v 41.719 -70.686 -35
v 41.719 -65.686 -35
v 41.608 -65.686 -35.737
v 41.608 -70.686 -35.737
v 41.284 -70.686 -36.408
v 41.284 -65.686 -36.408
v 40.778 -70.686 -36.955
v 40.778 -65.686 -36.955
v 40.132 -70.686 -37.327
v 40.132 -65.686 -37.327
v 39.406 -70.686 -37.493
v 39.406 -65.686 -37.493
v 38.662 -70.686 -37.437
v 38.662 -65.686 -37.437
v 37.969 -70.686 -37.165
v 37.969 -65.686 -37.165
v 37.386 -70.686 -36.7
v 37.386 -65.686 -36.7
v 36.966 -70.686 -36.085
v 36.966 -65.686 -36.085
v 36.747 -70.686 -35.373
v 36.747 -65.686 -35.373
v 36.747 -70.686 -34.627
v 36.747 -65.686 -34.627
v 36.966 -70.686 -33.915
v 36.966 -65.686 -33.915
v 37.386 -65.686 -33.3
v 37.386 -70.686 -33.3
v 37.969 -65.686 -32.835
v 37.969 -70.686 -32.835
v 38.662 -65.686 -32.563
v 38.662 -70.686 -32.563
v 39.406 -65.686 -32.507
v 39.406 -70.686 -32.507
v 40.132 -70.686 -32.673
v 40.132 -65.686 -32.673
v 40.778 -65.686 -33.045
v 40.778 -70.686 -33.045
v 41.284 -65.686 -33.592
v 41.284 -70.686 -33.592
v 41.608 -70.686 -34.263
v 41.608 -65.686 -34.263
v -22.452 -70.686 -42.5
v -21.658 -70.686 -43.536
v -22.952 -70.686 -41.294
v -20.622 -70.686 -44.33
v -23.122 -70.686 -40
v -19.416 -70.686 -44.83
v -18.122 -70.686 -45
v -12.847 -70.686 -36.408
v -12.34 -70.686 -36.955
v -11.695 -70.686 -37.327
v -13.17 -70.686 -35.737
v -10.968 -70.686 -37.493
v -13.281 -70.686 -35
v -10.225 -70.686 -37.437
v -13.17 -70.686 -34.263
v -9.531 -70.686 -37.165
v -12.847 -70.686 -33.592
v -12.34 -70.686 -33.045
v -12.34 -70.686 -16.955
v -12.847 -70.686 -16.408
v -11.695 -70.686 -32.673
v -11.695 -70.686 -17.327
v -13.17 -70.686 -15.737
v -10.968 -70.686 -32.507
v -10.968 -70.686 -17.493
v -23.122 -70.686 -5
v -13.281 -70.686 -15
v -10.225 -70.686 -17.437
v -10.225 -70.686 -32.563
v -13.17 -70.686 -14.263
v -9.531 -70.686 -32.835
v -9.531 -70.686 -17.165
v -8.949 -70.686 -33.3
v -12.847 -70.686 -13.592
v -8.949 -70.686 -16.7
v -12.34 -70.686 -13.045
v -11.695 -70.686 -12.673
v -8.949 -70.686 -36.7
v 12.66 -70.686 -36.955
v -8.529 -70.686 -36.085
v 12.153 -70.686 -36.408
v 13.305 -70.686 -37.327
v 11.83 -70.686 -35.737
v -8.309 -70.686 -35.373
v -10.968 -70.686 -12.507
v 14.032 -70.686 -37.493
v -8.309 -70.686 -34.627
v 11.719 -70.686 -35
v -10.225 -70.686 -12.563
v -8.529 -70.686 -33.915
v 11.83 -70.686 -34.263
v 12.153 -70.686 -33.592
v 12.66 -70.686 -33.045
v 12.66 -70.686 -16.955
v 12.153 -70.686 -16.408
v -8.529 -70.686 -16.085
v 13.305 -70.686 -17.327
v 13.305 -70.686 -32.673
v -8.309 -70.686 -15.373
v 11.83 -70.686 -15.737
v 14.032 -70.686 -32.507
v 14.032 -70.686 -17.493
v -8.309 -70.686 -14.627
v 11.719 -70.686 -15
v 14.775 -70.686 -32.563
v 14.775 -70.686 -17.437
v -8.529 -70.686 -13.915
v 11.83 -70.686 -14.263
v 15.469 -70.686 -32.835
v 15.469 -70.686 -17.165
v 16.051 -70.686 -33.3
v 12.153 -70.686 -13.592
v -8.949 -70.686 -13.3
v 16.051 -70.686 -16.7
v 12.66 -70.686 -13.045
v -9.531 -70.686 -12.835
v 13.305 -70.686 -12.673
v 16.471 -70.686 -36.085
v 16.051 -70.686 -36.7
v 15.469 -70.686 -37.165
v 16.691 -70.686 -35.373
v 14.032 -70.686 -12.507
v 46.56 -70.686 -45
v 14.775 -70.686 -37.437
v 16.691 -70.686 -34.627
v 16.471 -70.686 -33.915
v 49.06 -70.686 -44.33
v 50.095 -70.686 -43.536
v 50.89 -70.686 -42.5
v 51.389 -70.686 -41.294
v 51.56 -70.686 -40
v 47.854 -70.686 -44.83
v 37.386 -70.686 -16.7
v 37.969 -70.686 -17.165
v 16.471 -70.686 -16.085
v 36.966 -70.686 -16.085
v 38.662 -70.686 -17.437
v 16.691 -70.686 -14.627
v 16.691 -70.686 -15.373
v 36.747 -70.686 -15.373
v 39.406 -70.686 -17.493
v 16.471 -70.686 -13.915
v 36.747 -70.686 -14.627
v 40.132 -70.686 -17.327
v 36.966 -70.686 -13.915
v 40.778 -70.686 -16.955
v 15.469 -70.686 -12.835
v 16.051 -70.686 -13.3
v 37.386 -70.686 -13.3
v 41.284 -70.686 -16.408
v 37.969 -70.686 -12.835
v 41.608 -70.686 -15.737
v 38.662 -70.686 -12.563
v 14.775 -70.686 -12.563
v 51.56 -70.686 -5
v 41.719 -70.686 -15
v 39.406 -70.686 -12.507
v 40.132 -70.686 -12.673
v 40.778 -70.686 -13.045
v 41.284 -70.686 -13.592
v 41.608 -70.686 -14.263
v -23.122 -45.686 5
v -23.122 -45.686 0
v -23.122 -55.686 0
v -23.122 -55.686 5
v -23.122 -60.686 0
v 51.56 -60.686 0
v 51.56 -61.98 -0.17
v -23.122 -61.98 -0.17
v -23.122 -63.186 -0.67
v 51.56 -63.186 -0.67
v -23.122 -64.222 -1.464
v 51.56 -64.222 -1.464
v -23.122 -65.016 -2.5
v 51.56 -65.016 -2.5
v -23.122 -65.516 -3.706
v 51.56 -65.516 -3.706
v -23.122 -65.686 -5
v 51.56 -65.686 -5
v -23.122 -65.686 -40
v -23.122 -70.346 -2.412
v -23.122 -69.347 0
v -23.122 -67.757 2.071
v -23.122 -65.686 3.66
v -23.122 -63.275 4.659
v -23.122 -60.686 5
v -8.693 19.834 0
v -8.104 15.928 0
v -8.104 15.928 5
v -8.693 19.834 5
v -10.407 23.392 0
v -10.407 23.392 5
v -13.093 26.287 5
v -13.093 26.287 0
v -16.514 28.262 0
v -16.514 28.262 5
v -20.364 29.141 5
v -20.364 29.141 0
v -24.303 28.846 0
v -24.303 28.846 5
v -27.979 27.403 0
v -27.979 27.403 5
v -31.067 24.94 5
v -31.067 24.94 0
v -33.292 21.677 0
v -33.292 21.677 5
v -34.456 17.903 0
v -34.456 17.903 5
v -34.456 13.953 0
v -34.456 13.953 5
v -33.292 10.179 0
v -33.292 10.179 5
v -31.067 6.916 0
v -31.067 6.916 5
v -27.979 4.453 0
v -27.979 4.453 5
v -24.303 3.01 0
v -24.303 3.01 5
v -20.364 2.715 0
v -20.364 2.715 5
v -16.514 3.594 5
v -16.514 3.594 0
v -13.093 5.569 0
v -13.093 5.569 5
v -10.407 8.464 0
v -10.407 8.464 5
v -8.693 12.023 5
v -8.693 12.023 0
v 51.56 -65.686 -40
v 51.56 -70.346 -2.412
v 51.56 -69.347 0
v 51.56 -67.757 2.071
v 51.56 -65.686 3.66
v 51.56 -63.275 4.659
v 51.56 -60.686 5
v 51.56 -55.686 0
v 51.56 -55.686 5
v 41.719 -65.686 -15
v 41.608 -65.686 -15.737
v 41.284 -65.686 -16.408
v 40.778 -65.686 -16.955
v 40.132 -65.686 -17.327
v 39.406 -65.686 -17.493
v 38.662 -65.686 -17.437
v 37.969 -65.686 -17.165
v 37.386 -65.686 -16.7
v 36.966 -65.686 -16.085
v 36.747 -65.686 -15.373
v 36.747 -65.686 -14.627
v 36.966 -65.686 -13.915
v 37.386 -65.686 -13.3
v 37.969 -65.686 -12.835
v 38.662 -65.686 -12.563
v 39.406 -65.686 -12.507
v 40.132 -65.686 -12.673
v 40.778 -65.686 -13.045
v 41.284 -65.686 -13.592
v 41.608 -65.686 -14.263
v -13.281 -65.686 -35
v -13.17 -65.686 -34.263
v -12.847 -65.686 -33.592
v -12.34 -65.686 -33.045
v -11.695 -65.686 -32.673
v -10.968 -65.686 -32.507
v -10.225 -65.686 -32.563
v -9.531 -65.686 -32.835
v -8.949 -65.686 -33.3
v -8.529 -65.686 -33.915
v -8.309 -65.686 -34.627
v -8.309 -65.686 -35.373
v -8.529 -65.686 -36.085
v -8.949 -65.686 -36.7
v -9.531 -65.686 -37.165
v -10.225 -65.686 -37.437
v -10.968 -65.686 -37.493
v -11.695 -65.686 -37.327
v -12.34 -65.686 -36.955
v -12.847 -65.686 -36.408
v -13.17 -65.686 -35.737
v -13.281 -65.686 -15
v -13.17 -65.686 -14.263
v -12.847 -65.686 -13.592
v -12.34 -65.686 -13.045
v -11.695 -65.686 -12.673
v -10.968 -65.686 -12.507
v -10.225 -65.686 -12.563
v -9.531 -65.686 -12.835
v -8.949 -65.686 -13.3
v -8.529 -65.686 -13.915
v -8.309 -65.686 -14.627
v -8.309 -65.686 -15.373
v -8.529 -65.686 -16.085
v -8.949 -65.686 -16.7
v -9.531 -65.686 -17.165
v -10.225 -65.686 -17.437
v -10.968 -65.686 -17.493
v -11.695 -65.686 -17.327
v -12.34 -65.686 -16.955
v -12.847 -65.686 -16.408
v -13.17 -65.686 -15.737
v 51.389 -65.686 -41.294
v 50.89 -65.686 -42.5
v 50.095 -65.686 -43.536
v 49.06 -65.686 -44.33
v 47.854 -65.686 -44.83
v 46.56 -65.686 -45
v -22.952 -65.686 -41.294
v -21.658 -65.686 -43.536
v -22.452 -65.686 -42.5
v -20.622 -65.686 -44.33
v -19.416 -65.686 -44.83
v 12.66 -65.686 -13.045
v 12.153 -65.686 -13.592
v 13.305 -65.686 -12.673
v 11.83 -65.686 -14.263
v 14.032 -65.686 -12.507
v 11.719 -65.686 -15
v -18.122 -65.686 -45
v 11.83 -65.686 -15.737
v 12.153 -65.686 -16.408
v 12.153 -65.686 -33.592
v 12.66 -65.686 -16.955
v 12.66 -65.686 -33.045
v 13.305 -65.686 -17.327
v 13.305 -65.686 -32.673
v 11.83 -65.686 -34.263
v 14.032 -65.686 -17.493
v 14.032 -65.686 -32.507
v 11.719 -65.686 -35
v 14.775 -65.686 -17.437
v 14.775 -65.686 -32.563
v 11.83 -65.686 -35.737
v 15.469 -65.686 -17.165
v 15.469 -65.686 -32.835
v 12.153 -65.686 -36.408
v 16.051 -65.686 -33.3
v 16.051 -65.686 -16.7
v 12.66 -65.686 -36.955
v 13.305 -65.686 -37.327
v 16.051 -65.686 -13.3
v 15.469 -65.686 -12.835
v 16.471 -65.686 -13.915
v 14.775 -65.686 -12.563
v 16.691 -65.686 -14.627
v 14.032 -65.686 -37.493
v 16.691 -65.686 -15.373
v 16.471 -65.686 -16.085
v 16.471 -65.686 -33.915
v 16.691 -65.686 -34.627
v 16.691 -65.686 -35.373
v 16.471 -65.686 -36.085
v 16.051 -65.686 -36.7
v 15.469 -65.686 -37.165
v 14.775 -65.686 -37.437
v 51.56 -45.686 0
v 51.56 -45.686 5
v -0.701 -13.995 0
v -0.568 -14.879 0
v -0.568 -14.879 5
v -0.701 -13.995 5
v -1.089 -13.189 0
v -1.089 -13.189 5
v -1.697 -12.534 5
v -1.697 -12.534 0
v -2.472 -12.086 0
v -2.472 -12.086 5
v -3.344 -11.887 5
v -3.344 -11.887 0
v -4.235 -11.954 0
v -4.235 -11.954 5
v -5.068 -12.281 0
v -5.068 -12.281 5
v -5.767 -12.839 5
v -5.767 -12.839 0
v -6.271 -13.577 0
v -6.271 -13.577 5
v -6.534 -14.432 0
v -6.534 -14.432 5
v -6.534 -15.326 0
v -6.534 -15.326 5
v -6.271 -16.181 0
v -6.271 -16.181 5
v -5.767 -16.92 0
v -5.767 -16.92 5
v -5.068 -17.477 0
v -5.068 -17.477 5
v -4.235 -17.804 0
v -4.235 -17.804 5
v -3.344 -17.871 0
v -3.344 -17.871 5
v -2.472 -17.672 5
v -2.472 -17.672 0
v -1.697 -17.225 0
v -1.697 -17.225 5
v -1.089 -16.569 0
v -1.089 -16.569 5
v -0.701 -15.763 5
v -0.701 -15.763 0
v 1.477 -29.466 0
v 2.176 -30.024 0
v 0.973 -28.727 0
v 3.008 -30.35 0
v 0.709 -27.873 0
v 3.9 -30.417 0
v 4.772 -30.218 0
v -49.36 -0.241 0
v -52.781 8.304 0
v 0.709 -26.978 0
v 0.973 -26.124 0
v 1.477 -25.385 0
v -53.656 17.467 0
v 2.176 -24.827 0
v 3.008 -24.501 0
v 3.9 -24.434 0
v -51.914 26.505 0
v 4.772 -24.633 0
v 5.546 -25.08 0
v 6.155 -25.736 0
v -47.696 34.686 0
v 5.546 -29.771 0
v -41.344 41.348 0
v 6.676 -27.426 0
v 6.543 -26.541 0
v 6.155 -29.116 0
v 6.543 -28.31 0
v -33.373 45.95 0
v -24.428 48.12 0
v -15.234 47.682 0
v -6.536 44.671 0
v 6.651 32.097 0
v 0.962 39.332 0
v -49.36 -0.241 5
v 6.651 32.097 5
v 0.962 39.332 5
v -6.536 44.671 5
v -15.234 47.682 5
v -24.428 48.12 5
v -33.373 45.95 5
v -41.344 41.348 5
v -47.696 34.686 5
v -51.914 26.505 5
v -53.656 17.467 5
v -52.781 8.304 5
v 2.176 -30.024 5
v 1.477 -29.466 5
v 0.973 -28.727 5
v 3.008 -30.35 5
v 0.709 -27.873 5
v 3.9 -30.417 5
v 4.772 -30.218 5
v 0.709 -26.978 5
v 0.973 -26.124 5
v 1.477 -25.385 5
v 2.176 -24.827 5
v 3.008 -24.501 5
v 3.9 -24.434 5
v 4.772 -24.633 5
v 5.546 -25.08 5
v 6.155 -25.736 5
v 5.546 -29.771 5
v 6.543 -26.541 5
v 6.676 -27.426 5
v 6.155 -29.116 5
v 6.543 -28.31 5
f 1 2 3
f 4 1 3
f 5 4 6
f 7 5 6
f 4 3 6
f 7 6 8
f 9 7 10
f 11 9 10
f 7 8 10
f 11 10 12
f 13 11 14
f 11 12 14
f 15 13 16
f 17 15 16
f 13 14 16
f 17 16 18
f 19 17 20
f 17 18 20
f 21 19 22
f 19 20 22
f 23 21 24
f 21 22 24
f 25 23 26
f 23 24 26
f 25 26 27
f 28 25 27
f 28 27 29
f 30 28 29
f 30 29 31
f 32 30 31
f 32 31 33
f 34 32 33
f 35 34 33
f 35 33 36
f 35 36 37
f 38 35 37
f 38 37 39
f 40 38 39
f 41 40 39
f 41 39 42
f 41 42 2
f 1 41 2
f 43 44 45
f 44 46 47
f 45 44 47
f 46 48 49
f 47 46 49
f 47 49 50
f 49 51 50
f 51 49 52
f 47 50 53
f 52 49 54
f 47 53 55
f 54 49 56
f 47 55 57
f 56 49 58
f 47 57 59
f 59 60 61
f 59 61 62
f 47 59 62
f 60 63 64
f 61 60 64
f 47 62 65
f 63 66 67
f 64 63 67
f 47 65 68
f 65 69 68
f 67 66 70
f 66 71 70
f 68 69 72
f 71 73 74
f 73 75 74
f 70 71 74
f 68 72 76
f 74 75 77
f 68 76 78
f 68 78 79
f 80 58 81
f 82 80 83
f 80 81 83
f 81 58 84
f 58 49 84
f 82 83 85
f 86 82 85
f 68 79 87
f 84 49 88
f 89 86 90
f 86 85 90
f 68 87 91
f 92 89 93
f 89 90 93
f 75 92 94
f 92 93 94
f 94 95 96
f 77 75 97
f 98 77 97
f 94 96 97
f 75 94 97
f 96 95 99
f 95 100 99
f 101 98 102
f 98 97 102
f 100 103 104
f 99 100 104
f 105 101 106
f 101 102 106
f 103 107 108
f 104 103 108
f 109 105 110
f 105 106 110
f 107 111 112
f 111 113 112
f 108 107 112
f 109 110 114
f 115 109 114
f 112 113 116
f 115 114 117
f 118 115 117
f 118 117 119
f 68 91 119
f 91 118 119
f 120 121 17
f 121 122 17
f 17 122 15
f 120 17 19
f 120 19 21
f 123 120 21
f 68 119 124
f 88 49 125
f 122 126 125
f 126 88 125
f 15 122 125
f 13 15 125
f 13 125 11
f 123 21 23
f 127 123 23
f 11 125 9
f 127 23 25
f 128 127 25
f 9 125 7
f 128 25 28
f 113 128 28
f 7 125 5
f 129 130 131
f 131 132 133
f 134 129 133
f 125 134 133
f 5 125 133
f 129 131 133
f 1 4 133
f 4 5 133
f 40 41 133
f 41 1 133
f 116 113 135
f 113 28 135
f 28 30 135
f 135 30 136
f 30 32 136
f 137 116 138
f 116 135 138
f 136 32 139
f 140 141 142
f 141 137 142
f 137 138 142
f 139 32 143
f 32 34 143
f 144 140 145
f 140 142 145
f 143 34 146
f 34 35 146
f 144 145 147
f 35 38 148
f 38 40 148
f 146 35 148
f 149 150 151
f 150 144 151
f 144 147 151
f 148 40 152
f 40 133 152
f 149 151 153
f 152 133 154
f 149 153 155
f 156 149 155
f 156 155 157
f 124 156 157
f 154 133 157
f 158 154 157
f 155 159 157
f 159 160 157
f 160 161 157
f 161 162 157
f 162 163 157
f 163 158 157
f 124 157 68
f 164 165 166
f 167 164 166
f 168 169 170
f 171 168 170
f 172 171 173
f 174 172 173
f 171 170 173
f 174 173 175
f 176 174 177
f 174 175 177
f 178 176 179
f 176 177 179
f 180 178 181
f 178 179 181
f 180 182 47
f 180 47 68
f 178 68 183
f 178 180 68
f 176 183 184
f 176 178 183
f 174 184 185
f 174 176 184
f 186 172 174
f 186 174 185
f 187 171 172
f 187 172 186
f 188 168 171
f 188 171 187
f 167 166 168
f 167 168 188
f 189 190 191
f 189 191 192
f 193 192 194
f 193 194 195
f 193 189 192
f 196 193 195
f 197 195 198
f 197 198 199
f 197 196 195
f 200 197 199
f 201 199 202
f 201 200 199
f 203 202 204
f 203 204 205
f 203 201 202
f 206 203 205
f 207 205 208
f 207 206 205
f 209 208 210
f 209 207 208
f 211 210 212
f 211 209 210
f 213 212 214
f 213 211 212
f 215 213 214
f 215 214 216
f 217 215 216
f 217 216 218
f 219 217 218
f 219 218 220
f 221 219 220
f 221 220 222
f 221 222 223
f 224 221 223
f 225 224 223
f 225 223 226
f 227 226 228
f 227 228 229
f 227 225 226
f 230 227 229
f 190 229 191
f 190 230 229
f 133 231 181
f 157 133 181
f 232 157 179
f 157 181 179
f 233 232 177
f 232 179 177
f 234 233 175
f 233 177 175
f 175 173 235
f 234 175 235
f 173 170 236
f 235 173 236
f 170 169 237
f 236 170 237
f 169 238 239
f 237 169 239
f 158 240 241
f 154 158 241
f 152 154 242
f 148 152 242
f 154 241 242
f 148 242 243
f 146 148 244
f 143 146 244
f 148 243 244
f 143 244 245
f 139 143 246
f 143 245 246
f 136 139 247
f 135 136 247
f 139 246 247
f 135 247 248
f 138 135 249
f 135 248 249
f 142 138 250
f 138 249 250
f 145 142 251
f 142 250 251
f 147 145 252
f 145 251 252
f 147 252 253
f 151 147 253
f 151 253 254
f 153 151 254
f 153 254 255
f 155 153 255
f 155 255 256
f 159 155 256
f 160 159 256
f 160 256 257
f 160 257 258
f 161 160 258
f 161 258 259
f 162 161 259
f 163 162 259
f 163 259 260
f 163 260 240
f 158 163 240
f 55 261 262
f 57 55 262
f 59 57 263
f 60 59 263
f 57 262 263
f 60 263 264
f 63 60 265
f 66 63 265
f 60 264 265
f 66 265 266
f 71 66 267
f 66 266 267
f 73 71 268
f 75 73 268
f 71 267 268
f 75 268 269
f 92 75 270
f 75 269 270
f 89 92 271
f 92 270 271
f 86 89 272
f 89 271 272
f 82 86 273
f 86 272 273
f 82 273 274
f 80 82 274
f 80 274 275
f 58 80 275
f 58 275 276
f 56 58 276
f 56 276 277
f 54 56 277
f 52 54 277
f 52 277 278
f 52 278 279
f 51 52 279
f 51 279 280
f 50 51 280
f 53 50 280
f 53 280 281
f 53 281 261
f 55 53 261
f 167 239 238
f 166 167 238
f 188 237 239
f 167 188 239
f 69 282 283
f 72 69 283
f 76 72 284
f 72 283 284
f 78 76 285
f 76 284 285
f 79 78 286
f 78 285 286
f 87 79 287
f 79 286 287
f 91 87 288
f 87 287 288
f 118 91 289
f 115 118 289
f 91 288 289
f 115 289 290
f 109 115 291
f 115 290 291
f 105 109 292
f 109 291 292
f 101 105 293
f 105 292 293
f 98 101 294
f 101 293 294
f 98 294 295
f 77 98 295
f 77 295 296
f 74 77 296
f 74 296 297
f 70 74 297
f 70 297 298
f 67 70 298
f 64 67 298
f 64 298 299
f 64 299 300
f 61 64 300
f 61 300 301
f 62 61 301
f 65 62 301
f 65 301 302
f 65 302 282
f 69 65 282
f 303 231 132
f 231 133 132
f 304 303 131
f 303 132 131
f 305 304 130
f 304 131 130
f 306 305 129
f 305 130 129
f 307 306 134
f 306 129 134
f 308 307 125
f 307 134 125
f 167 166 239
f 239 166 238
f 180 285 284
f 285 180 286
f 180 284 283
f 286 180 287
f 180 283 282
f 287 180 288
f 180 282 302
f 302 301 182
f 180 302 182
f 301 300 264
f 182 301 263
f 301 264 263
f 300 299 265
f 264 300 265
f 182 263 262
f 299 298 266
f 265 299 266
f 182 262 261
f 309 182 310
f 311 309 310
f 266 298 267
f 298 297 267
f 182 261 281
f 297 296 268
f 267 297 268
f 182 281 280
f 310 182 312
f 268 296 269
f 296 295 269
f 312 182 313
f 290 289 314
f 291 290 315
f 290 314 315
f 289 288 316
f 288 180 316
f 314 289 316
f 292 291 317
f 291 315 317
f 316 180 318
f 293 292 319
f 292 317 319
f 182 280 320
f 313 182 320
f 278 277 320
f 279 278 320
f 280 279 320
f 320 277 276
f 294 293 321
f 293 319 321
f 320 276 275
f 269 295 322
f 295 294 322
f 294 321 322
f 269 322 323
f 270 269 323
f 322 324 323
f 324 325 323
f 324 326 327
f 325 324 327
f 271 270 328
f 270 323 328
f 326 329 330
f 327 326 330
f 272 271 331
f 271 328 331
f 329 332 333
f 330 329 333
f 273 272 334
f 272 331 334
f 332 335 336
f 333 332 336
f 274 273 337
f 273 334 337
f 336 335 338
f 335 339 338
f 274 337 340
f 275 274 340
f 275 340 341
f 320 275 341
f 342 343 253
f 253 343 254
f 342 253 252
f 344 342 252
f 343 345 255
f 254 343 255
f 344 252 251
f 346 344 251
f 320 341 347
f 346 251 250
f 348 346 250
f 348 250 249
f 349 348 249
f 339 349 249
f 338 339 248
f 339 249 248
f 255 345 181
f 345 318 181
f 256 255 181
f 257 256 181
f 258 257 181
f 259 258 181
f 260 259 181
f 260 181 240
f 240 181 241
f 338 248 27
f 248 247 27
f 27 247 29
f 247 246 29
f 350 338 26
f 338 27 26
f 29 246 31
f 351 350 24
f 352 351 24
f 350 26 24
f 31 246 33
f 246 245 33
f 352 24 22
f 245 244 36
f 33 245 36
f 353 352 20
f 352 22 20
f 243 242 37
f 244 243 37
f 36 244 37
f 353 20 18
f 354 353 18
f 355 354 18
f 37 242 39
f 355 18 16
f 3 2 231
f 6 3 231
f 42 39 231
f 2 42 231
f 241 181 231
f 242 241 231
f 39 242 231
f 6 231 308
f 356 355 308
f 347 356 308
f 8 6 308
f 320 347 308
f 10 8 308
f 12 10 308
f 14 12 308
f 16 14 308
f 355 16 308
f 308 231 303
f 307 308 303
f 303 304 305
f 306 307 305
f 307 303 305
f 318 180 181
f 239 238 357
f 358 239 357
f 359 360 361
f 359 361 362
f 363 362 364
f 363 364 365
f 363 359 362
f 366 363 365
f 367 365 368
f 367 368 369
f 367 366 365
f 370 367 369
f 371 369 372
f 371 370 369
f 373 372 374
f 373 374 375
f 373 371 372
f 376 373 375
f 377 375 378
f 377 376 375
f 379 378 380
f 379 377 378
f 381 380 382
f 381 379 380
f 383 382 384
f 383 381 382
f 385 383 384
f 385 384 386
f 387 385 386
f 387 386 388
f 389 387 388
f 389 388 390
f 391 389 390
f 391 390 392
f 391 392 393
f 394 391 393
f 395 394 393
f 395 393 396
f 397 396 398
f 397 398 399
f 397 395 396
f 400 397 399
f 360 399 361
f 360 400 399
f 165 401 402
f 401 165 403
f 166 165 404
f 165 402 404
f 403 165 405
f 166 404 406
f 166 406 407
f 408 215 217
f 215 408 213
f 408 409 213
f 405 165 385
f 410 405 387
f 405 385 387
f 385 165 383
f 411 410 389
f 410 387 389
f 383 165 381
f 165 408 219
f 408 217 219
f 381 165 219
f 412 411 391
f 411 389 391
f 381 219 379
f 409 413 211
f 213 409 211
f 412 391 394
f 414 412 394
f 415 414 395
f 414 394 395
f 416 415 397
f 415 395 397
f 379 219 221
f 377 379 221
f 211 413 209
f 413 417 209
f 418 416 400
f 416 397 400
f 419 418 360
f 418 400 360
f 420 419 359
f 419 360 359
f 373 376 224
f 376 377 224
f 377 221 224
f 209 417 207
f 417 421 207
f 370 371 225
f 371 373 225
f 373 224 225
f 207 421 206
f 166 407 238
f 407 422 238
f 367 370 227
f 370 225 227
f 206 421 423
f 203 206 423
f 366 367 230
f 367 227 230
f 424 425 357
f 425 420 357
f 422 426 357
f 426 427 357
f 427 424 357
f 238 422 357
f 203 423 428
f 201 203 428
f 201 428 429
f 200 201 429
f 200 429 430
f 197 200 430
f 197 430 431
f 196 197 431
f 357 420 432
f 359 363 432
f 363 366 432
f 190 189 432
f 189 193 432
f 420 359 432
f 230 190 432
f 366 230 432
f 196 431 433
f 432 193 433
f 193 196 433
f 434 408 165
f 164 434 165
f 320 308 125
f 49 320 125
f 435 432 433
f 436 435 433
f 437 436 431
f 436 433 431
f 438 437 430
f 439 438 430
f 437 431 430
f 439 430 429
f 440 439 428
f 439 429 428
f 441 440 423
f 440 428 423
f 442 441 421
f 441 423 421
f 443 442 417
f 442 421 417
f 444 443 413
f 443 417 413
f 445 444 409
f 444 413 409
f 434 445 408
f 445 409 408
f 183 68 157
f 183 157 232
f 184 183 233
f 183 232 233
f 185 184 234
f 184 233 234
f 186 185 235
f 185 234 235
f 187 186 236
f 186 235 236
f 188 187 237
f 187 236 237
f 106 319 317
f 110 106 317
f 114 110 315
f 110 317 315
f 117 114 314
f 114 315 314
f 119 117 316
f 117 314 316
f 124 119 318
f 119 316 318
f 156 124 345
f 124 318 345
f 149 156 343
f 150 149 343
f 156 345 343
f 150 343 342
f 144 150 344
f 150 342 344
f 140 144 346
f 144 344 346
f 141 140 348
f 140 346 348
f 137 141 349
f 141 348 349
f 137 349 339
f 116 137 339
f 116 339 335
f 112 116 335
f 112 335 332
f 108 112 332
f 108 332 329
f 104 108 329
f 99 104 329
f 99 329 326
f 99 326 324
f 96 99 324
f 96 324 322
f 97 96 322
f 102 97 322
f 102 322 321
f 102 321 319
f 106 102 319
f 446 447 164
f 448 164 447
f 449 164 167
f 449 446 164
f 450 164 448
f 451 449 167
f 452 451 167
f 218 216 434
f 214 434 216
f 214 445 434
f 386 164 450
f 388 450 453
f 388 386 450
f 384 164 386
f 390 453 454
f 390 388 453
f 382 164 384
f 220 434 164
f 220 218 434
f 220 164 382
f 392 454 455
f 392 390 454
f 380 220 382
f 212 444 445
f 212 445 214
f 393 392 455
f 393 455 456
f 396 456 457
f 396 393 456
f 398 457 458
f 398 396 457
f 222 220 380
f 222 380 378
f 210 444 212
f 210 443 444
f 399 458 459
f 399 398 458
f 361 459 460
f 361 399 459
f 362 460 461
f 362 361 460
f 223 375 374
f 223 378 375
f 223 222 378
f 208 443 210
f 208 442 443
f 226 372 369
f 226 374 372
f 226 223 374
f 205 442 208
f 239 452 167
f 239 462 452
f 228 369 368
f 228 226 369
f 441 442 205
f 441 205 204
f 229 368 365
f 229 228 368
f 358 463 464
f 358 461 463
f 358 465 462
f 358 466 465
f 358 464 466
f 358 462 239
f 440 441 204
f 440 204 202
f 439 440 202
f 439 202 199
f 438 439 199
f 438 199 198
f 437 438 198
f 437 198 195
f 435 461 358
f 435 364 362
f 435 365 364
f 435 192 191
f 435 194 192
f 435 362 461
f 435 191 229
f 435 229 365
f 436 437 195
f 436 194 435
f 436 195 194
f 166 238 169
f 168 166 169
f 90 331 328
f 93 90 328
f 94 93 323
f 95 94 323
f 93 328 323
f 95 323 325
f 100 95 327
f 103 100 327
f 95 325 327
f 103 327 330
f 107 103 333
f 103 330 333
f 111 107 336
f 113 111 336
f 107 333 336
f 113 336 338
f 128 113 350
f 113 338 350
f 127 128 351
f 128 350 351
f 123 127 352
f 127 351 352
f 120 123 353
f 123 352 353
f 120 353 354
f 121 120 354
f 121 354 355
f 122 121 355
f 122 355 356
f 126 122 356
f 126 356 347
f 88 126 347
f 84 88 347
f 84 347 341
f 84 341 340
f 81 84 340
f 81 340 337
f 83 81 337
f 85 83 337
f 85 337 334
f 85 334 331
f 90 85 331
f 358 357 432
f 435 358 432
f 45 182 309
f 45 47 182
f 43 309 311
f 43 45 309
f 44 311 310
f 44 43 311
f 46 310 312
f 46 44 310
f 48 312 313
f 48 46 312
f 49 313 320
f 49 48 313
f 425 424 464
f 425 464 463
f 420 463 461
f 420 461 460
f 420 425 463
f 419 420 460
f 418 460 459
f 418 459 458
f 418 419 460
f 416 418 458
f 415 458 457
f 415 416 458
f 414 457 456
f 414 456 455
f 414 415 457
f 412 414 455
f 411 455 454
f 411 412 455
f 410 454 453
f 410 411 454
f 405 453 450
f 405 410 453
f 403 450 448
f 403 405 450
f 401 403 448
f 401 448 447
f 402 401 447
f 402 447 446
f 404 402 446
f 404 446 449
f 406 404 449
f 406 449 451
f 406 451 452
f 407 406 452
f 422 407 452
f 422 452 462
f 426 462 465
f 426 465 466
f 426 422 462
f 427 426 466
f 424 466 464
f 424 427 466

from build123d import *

# Parameters (mm, degrees)
SKETCH_1_R             = 13.25
SKETCH_1_R_2           = 3
EXTRUDE_1_DEPTH        = 5
SM_BASE_FLANGE_1_DEPTH = 74.681955
SKETCH_8_R             = 2.5
CUT_EXTRUDE_1_DEPTH    = 134.765093758
FILLET_1_R             = 5


# Sheet-metal steps are written as plain solids
with BuildPart() as part:
    # Sketch 1 → 凸台-拉伸1 (new body)
    with BuildSketch(Plane.XY):
        with BuildLine():
            Line((-49.360062144, -0.241015089), (-23.122201524, -45.686322765))
            Line((-23.122201524, -45.686322765), (-23.122201524, -55.686322765))
            Line((-23.122201524, -55.686322765), (51.559753885, -55.686322765))
            Line((51.559753885, -55.686322765), (51.559753885, -45.686322765))
            Line((51.559753885, -45.686322765), (6.651404412, 32.097220205))
            ThreePointArc((6.651404412, 32.097220205), (-37.523446513, 43.933835837), (-49.360062144, -0.241015089))
        make_face()
        with Locations((-21.354328866, 15.928102558)):
            Circle(SKETCH_1_R, mode=Mode.SUBTRACT)
        with Locations((-3.567776343, -14.879110103)):
            Circle(SKETCH_1_R_2, mode=Mode.SUBTRACT)
        with Locations((3.675910259, -27.425543331)):
            Circle(SKETCH_1_R_2, mode=Mode.SUBTRACT)
    extrude(amount=EXTRUDE_1_DEPTH)


with BuildPart() as body_2:
    # 草图3 → 基体-法兰1 (new body)
    with BuildSketch(Plane(origin=(51.559753885, 0, 0), x_dir=(0, 0, -1), z_dir=(1, 0, 0))):
        with BuildLine():
            Line((0, -55.686322765), (0, -60.686322765))
            ThreePointArc((0, -60.686322765), (1.464466094, -64.221856671), (5, -65.686322765))
            Line((5, -65.686322765), (45, -65.686322765))
            Line((45, -65.686322765), (45, -70.686322765))
            Line((45, -70.686322765), (5, -70.686322765))
            ThreePointArc((5, -70.686322765), (-2.071067812, -67.757390577), (-5, -60.686322765))
            Line((-5, -60.686322765), (-5, -55.686322765))
            Line((-5, -55.686322765), (0, -55.686322765))
        make_face()
    extrude(amount=-SM_BASE_FLANGE_1_DEPTH)

    # 草图8 → 切除-拉伸1 (cut, through all)
    with BuildSketch(Plane(origin=(0, -65.686322765, 0), x_dir=(1, 0, 0), z_dir=(0, 1, 0))):
        with Locations(Location((14.21877618, 35, 0), (0, 0, 180))):
            Circle(SKETCH_8_R)
        with Locations(Location((-10.78122382, 35, 0), (0, 0, 180))):
            Circle(SKETCH_8_R)
        with Locations(Location((-10.78122382, 15, 0), (0, 0, 180))):
            Circle(SKETCH_8_R)
        with Locations((39.21877618, 15)):
            Circle(SKETCH_8_R)
        with Locations((39.21877618, 35)):
            Circle(SKETCH_8_R)
        with Locations(Location((14.21877618, 15, 0), (0, 0, 180))):
            Circle(SKETCH_8_R)
    extrude(amount=-CUT_EXTRUDE_1_DEPTH, mode=Mode.SUBTRACT)

    # 圆角1
    fillet_1_edges = [body_2.edges().sort_by_distance(p)[0] for p in [
        (-23.122201115, -68.186322765, -45),
        (51.559753885, -68.186322765, -45),
    ]]
    fillet(fillet_1_edges, radius=FILLET_1_R)


solid = Compound([part.part, body_2.part])
